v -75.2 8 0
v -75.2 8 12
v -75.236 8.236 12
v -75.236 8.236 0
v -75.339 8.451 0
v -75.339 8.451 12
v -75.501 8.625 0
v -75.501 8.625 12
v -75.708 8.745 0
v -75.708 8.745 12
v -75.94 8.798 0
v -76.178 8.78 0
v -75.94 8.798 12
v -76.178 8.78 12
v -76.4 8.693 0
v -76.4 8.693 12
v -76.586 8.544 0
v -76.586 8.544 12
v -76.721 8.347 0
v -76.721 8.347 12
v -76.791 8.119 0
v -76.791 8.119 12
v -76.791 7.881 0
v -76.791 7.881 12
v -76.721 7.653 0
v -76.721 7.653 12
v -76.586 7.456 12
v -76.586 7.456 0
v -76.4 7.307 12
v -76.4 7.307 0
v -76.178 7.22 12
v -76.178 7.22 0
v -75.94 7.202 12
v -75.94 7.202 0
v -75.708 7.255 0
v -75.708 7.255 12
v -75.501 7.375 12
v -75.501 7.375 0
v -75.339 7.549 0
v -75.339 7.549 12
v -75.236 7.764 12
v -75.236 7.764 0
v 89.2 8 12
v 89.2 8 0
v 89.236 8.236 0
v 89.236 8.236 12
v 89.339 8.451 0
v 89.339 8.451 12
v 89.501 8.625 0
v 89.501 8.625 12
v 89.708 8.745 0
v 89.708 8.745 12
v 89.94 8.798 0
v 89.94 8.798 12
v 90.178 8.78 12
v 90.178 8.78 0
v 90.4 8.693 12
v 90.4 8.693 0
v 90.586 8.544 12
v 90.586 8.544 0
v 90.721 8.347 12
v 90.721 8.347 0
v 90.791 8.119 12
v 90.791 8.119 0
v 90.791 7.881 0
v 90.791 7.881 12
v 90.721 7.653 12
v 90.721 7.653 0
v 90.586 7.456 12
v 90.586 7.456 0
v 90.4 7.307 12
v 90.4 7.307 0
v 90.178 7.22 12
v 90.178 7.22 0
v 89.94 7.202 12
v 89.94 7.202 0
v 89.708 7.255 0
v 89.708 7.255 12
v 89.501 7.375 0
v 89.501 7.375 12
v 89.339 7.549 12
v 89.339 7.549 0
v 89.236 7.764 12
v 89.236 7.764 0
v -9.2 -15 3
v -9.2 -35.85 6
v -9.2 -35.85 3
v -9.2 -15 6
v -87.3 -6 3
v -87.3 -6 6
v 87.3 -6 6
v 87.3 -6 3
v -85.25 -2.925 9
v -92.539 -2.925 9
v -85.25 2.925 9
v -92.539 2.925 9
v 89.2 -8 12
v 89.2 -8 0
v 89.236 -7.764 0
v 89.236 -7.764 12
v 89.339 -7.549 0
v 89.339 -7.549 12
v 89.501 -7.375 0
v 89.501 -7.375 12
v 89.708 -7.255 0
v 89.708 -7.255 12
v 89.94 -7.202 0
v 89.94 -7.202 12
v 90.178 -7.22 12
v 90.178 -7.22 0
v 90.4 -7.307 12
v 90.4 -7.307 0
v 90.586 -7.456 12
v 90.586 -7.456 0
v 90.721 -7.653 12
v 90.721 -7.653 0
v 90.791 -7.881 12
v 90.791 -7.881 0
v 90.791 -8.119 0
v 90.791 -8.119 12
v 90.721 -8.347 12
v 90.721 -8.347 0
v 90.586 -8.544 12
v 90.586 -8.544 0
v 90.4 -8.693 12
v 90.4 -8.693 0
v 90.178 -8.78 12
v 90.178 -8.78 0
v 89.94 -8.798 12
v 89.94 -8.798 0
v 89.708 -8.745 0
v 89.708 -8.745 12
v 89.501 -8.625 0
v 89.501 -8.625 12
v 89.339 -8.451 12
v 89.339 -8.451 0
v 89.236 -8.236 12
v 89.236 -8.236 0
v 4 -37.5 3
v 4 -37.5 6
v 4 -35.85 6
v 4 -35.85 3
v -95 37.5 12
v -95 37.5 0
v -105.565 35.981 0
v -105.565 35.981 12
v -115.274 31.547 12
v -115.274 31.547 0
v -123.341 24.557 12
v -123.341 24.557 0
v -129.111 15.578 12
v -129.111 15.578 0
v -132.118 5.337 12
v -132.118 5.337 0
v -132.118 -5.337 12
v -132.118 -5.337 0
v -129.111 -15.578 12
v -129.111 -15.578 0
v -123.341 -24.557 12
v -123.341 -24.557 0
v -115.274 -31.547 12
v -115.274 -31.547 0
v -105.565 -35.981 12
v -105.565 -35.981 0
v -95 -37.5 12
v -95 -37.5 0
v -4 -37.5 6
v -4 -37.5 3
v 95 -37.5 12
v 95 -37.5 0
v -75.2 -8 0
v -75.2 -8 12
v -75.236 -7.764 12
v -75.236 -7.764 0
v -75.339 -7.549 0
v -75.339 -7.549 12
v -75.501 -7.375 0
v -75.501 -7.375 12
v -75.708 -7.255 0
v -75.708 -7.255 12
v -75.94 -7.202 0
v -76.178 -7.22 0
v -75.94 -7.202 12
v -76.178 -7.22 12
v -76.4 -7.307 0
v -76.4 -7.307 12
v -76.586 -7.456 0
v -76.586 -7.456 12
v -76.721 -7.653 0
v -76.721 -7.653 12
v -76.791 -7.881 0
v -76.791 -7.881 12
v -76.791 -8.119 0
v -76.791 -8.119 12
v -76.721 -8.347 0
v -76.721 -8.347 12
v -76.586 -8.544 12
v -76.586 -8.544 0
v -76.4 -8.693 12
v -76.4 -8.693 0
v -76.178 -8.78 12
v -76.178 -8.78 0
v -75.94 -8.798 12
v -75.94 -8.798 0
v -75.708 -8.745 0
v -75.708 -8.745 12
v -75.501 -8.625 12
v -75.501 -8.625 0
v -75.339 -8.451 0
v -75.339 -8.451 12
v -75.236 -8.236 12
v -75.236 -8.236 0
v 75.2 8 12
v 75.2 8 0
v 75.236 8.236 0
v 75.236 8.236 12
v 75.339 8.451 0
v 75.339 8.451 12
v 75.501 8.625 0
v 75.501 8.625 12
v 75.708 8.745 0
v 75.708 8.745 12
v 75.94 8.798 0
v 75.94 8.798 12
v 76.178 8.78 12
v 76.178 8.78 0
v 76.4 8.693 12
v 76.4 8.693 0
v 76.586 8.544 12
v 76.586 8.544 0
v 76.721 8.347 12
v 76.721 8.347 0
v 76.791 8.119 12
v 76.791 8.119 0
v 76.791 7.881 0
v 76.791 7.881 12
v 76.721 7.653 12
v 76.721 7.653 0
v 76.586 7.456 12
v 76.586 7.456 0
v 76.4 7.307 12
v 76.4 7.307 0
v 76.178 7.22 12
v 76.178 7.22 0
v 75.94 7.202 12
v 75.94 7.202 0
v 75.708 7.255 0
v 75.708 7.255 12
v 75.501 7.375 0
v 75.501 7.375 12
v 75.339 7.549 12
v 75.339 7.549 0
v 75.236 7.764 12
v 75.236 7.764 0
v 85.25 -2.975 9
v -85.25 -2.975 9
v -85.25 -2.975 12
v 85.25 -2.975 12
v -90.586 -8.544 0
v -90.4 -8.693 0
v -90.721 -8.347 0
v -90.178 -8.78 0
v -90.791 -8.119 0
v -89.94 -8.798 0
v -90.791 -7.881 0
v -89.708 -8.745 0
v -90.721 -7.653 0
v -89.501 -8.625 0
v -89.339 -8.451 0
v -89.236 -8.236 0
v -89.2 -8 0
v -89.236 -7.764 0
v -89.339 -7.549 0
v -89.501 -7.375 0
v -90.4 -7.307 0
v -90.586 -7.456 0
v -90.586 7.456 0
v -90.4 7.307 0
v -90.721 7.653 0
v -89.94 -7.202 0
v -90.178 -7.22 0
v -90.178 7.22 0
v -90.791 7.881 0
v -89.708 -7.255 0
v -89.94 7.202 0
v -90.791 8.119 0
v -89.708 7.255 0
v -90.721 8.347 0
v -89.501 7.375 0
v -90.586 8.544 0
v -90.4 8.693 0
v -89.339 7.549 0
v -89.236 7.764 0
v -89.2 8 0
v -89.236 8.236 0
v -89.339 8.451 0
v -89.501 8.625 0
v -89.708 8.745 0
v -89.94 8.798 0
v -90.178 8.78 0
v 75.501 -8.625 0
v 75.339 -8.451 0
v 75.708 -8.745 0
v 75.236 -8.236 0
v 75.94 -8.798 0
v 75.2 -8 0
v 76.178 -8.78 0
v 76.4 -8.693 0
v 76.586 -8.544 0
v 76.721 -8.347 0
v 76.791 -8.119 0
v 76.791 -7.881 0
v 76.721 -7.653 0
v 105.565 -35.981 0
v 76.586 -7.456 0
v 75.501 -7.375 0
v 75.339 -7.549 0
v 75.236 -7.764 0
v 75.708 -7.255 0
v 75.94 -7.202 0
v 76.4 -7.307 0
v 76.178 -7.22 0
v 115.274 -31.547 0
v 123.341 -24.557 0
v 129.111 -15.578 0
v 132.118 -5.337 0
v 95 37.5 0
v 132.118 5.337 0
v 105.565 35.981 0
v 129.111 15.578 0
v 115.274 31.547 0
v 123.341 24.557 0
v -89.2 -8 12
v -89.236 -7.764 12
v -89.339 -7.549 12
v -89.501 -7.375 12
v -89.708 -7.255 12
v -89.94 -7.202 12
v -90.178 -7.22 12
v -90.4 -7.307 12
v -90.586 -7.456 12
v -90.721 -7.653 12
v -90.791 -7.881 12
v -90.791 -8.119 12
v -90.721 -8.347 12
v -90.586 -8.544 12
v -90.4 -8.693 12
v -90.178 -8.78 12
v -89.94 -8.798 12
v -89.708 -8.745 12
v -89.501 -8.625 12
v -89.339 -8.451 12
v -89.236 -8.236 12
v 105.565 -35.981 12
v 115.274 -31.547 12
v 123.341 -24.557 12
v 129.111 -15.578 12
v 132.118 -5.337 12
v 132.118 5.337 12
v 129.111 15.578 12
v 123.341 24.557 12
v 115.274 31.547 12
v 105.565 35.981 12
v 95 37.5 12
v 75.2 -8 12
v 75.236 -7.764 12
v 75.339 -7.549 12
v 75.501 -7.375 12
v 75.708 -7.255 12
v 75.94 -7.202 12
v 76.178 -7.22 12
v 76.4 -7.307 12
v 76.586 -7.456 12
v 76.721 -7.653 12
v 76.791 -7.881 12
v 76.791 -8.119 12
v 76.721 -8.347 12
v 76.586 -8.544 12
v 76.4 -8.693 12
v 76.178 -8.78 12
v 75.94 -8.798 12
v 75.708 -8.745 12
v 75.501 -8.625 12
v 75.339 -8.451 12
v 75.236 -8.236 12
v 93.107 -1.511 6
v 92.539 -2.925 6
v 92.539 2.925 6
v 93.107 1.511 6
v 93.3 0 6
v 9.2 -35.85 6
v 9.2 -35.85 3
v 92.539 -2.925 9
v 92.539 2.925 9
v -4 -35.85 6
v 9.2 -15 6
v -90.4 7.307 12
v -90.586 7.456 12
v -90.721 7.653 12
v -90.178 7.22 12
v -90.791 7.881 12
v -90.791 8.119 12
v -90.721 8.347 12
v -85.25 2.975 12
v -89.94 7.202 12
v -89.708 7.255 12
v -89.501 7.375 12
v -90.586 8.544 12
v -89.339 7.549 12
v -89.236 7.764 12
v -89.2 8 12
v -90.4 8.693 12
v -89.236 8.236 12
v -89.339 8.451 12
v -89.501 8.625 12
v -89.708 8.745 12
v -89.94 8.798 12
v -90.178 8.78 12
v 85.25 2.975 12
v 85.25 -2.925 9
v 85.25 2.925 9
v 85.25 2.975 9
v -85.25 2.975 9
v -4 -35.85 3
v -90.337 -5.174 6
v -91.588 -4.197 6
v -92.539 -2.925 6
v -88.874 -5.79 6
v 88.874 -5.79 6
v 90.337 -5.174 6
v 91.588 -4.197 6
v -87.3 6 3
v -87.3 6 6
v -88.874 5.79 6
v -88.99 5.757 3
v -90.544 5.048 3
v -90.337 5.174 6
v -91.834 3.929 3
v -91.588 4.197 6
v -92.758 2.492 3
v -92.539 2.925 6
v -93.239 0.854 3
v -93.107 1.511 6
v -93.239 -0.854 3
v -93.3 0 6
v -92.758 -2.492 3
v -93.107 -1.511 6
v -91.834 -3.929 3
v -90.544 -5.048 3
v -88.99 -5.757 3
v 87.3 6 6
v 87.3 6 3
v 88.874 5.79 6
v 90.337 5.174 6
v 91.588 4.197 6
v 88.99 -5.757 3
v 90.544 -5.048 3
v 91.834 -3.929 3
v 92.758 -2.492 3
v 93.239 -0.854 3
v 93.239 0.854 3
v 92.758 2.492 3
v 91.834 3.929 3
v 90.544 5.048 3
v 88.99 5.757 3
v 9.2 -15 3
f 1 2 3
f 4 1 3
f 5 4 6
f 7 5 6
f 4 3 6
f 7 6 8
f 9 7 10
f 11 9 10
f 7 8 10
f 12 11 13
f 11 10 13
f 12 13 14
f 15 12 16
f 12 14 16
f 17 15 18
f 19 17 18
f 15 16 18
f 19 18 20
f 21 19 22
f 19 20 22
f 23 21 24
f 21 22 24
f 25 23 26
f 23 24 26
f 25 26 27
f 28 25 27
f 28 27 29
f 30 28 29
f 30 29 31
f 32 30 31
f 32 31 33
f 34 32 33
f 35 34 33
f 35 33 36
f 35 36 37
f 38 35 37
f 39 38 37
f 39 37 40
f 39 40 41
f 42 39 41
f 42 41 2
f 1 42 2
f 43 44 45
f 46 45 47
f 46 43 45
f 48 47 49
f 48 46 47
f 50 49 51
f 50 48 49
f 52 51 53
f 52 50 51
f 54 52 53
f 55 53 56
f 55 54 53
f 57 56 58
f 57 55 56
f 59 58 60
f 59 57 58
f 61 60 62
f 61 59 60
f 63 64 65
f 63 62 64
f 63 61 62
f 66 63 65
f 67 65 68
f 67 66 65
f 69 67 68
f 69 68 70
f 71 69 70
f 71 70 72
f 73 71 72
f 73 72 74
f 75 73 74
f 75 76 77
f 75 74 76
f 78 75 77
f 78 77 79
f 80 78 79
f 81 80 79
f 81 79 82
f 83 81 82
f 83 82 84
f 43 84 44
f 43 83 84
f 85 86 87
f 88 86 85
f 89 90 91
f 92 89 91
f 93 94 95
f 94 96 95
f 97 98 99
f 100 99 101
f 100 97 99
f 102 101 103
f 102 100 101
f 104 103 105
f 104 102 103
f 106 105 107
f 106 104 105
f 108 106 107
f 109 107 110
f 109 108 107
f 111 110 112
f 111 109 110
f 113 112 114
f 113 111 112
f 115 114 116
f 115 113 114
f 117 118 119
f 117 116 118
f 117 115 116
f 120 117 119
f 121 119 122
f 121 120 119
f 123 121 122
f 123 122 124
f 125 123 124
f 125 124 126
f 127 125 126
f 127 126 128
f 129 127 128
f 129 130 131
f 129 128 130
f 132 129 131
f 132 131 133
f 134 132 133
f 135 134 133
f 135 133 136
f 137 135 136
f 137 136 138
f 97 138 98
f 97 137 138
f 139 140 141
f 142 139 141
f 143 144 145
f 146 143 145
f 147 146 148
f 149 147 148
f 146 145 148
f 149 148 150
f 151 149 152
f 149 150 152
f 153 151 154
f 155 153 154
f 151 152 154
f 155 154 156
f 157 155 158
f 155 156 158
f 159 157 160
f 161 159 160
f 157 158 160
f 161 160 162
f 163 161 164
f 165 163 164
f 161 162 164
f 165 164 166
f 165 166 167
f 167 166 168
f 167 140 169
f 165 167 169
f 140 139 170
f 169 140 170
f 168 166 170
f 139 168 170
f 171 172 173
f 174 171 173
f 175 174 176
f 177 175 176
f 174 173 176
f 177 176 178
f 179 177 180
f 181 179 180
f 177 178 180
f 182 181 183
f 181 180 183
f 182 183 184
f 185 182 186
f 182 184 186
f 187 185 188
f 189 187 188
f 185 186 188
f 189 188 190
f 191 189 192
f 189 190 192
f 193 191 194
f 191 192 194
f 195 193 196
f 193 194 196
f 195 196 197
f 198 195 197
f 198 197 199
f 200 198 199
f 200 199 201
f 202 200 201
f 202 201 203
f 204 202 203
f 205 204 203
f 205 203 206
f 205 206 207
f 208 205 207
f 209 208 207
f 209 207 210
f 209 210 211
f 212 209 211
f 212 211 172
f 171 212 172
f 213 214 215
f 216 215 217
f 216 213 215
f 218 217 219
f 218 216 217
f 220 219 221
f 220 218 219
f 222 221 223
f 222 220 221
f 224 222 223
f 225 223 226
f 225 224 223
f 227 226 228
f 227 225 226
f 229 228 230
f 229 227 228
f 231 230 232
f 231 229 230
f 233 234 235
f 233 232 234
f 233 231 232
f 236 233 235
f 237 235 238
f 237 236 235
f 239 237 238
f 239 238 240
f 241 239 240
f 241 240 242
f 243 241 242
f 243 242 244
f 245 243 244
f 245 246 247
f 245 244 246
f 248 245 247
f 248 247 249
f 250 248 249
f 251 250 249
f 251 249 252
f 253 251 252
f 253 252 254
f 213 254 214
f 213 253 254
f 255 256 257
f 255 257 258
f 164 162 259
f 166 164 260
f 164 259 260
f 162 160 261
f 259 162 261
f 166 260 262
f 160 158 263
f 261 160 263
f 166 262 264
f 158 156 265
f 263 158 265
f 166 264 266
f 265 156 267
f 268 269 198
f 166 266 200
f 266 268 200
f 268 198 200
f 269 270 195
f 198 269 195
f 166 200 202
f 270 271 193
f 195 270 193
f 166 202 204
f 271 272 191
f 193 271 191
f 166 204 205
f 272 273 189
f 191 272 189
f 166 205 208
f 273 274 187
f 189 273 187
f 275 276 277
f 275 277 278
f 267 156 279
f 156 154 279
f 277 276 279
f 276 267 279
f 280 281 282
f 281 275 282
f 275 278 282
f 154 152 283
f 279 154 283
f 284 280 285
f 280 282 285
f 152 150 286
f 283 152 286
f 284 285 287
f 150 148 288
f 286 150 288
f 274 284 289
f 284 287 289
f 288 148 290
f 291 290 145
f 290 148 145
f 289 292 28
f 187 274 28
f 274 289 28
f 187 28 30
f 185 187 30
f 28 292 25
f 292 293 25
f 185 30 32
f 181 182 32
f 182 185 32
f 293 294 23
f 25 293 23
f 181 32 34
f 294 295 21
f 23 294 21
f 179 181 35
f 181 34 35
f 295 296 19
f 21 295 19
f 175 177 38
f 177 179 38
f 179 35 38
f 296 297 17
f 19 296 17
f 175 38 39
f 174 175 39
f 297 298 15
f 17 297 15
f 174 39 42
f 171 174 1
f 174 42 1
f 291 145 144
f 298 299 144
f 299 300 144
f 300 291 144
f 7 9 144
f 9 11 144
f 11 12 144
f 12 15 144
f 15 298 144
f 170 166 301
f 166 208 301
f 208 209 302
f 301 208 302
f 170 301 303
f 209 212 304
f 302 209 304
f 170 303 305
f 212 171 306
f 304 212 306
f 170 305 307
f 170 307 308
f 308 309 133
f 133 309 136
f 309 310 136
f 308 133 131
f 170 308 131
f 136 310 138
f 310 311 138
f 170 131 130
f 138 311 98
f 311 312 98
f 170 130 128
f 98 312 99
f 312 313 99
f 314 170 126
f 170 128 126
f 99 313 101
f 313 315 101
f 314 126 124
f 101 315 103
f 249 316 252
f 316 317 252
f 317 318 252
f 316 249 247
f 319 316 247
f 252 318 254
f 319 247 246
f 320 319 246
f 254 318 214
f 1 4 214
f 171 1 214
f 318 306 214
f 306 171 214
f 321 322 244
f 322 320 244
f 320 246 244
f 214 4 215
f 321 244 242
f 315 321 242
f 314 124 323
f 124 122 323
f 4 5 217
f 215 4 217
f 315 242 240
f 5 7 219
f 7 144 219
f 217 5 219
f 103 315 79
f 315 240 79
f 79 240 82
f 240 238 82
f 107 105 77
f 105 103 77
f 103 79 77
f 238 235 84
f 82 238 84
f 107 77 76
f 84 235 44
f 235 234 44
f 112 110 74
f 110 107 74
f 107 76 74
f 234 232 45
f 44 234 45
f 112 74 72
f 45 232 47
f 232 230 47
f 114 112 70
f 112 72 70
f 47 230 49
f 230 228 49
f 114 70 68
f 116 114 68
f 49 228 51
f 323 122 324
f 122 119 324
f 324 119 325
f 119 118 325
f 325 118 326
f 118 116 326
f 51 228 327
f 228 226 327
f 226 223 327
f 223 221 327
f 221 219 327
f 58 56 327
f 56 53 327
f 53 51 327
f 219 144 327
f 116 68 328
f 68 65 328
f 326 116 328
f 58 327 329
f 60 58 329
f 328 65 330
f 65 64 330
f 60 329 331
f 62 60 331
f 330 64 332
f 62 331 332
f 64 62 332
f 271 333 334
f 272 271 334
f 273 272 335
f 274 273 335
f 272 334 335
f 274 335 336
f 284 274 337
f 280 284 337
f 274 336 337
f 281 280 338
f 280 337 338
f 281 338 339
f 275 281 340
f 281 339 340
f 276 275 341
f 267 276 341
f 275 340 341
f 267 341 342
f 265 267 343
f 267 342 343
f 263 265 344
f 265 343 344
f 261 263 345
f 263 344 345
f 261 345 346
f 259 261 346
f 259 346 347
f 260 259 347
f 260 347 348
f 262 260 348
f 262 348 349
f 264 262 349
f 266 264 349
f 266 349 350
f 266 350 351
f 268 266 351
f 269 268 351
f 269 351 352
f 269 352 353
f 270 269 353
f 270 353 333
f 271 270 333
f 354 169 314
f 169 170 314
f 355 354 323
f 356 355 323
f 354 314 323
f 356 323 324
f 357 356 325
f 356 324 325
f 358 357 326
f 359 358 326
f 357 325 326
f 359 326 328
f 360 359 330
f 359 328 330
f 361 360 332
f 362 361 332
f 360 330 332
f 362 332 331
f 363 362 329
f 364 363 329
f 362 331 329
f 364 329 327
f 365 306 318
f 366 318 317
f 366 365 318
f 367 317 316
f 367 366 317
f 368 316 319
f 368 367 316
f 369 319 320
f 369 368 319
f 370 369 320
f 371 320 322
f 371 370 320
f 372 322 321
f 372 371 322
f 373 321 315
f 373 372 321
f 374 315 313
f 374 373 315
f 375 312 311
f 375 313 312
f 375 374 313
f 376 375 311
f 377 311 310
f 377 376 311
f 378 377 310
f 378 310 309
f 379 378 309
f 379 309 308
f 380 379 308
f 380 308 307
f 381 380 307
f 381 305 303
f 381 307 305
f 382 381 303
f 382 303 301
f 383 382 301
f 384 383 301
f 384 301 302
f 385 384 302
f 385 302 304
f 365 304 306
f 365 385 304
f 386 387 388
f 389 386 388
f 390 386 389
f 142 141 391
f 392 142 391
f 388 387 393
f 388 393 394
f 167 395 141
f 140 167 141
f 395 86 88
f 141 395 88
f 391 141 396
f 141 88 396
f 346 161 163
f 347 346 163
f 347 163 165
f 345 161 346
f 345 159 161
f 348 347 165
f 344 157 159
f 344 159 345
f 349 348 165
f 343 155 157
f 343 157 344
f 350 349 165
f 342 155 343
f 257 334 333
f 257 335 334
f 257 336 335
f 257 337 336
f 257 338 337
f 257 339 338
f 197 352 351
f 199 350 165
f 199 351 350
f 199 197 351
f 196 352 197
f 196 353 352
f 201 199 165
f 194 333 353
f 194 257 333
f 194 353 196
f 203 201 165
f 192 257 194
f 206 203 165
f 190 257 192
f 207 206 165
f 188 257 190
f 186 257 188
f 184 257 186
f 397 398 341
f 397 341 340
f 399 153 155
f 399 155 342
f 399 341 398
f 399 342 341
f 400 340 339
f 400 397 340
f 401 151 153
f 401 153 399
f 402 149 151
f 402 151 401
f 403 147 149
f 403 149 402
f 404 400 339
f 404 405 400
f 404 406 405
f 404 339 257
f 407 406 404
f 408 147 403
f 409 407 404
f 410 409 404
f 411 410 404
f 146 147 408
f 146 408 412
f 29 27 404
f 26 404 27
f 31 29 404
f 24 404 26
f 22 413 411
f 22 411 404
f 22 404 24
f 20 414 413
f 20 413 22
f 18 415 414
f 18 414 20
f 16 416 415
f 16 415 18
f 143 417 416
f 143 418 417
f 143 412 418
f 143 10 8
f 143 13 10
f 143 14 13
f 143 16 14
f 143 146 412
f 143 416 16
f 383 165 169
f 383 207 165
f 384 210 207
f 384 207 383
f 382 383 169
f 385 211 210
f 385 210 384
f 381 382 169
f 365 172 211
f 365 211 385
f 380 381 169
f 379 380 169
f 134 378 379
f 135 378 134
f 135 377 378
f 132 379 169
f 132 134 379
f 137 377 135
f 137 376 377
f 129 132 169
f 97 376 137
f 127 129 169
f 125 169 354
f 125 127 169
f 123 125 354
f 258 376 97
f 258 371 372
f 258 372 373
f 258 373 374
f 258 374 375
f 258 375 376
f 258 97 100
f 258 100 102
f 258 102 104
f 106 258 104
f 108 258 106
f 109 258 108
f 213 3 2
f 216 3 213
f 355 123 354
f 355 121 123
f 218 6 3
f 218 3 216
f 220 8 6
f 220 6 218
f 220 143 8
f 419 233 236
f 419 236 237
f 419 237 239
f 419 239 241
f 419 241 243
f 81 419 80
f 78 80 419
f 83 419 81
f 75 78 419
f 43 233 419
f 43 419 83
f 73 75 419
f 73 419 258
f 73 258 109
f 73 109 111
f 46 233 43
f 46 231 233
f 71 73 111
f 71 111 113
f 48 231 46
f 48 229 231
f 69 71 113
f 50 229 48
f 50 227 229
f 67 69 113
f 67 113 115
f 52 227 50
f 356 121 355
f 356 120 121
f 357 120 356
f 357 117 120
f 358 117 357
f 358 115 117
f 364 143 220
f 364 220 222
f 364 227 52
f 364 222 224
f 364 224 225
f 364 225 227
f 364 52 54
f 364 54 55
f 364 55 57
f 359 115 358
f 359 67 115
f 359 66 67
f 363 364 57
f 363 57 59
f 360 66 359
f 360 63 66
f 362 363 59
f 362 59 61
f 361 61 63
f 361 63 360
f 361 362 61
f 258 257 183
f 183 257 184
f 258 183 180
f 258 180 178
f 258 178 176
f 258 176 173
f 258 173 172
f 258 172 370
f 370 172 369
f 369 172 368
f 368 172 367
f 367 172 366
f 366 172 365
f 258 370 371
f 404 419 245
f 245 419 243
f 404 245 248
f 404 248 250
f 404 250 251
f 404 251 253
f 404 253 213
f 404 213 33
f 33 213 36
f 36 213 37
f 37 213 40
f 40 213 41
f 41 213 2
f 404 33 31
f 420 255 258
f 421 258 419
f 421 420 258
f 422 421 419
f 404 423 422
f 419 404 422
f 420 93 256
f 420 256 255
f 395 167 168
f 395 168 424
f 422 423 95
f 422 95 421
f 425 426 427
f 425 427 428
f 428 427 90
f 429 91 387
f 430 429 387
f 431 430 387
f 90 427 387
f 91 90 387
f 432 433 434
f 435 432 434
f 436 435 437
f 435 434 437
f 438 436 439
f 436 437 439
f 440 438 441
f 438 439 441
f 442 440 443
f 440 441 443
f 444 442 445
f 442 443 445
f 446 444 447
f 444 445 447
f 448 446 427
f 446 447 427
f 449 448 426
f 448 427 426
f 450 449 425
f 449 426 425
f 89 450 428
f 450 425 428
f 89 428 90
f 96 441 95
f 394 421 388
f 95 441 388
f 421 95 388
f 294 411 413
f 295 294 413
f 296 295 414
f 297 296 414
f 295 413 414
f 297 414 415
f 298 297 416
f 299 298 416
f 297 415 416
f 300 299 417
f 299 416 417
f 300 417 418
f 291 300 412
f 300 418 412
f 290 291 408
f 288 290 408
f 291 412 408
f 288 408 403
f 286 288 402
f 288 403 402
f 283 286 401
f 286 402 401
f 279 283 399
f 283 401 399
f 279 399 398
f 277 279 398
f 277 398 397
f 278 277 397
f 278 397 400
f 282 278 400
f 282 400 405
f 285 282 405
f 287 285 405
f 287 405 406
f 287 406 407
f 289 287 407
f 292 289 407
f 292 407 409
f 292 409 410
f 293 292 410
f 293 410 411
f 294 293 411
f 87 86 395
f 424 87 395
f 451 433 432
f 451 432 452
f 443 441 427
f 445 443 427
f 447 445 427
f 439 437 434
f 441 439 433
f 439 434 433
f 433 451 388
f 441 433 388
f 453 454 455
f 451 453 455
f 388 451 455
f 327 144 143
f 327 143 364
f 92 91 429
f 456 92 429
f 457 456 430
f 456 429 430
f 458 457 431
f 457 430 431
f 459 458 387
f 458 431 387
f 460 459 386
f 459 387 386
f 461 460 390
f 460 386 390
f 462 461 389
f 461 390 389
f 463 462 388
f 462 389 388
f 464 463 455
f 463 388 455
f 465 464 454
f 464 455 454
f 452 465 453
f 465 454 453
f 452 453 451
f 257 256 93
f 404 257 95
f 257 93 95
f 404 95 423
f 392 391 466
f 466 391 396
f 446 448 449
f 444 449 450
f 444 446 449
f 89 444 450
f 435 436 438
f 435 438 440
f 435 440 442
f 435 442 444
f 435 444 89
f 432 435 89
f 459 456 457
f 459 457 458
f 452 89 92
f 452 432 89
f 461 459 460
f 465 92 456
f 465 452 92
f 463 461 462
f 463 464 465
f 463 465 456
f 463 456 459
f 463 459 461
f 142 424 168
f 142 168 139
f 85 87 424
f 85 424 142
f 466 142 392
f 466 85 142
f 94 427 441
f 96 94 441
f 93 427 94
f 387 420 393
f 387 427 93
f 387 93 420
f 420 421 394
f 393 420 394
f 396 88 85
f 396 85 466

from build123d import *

# Parameters (mm, degrees)
PAD_DEPTH       = 6
POCKET_DEPTH    = 3
SKETCH002_W     = 18.4
SKETCH002_H     = 20.85
POCKET001_DEPTH = 3
SKETCH003_W     = 8
SKETCH003_H     = 1.65
POCKET002_DEPTH = 3
SKETCH004_W     = 185.077476
SKETCH004_H     = 5.85
PAD001_DEPTH    = 3
SKETCH005_W     = 170.5
SKETCH005_H     = 5.95
PAD002_DEPTH    = 3
SKETCH007_R     = 0.8
POCKET003_DEPTH = 563.341185


with BuildPart() as part:
    # Sketch → Pad (new body)
    with BuildSketch(Plane.XY):
        with BuildLine():
            ThreePointArc((-95, 37.5), (-132.5, 0), (-95, -37.5))
            Line((-95, -37.5), (95, -37.5))
            ThreePointArc((95, -37.5), (132.5, 0), (95, 37.5))
            Line((-95, 37.5), (95, 37.5))
        make_face()
    extrude(amount=PAD_DEPTH)

    # Sketch001 (on Face6 of Pad) → Pocket (cut)
    with BuildSketch(Plane.XY.offset(6)):
        with BuildLine():
            ThreePointArc((-87.3, 6), (-93.3, 0), (-87.3, -6))
            Line((-87.3, -6), (87.3, -6))
            ThreePointArc((87.3, -6), (93.3, 0), (87.3, 6))
            Line((-87.3, 6), (87.3, 6))
        make_face()
    extrude(amount=-POCKET_DEPTH, mode=Mode.SUBTRACT)

    # Sketch002 (on Face5 of Pocket) → Pocket001 (cut)
    with BuildSketch(Plane.XY.offset(6)):
        with Locations((0, -25.425)):
            Rectangle(SKETCH002_W, SKETCH002_H)
    extrude(amount=-POCKET001_DEPTH, mode=Mode.SUBTRACT)

    # Sketch003 (on Face5 of Pocket001) → Pocket002 (cut)
    with BuildSketch(Plane.XY.offset(6)):
        with Locations((0, -36.675)):
            Rectangle(SKETCH003_W, SKETCH003_H)
    extrude(amount=-POCKET002_DEPTH, mode=Mode.SUBTRACT)

    # Sketch004 (on Face5 of Pocket002) → Pad001 (join)
    with BuildSketch(Plane.XY.offset(6)):
        with BuildLine():
            ThreePointArc((-95, 37.5), (-132.5, 0), (-95, -37.5))
            Line((-95, -37.5), (95, -37.5))
            ThreePointArc((95, -37.5), (132.5, 0), (95, 37.5))
            Line((-95, 37.5), (95, 37.5))
        make_face()
        Rectangle(SKETCH004_W, SKETCH004_H, mode=Mode.SUBTRACT)
    extrude(amount=PAD001_DEPTH)

    # Sketch005 (on Face12 of Pad001) → Pad002 (join)
    with BuildSketch(Plane.XY.offset(9)):
        with BuildLine():
            ThreePointArc((-95, 37.5), (-132.5, 0), (-95, -37.5))
            Line((-95, -37.5), (95, -37.5))
            ThreePointArc((95, -37.5), (132.5, 0), (95, 37.5))
            Line((-95, 37.5), (95, 37.5))
        make_face()
        Rectangle(SKETCH005_W, SKETCH005_H, mode=Mode.SUBTRACT)
    extrude(amount=PAD002_DEPTH)

    # Sketch007 (on Face20 of Pad002) → Pocket003 (cut, through all)
    with BuildSketch(Plane.XY.offset(12)):
        with Locations((-90, -8)):
            Circle(SKETCH007_R)
        with Locations((-90, 8)):
            Circle(SKETCH007_R)
        with Locations((-76, 8)):
            Circle(SKETCH007_R)
        with Locations((-76, -8)):
            Circle(SKETCH007_R)
    pocket003 = extrude(amount=-POCKET003_DEPTH, mode=Mode.SUBTRACT)

    # Mirrored: Pocket003 across Sketch007 V_Axis
    add(pocket003.mirror(Plane(origin=(0, 0, 12), x_dir=(0, 0, 1), z_dir=(1, 0, 0))), mode=Mode.SUBTRACT)


solid = part.part
